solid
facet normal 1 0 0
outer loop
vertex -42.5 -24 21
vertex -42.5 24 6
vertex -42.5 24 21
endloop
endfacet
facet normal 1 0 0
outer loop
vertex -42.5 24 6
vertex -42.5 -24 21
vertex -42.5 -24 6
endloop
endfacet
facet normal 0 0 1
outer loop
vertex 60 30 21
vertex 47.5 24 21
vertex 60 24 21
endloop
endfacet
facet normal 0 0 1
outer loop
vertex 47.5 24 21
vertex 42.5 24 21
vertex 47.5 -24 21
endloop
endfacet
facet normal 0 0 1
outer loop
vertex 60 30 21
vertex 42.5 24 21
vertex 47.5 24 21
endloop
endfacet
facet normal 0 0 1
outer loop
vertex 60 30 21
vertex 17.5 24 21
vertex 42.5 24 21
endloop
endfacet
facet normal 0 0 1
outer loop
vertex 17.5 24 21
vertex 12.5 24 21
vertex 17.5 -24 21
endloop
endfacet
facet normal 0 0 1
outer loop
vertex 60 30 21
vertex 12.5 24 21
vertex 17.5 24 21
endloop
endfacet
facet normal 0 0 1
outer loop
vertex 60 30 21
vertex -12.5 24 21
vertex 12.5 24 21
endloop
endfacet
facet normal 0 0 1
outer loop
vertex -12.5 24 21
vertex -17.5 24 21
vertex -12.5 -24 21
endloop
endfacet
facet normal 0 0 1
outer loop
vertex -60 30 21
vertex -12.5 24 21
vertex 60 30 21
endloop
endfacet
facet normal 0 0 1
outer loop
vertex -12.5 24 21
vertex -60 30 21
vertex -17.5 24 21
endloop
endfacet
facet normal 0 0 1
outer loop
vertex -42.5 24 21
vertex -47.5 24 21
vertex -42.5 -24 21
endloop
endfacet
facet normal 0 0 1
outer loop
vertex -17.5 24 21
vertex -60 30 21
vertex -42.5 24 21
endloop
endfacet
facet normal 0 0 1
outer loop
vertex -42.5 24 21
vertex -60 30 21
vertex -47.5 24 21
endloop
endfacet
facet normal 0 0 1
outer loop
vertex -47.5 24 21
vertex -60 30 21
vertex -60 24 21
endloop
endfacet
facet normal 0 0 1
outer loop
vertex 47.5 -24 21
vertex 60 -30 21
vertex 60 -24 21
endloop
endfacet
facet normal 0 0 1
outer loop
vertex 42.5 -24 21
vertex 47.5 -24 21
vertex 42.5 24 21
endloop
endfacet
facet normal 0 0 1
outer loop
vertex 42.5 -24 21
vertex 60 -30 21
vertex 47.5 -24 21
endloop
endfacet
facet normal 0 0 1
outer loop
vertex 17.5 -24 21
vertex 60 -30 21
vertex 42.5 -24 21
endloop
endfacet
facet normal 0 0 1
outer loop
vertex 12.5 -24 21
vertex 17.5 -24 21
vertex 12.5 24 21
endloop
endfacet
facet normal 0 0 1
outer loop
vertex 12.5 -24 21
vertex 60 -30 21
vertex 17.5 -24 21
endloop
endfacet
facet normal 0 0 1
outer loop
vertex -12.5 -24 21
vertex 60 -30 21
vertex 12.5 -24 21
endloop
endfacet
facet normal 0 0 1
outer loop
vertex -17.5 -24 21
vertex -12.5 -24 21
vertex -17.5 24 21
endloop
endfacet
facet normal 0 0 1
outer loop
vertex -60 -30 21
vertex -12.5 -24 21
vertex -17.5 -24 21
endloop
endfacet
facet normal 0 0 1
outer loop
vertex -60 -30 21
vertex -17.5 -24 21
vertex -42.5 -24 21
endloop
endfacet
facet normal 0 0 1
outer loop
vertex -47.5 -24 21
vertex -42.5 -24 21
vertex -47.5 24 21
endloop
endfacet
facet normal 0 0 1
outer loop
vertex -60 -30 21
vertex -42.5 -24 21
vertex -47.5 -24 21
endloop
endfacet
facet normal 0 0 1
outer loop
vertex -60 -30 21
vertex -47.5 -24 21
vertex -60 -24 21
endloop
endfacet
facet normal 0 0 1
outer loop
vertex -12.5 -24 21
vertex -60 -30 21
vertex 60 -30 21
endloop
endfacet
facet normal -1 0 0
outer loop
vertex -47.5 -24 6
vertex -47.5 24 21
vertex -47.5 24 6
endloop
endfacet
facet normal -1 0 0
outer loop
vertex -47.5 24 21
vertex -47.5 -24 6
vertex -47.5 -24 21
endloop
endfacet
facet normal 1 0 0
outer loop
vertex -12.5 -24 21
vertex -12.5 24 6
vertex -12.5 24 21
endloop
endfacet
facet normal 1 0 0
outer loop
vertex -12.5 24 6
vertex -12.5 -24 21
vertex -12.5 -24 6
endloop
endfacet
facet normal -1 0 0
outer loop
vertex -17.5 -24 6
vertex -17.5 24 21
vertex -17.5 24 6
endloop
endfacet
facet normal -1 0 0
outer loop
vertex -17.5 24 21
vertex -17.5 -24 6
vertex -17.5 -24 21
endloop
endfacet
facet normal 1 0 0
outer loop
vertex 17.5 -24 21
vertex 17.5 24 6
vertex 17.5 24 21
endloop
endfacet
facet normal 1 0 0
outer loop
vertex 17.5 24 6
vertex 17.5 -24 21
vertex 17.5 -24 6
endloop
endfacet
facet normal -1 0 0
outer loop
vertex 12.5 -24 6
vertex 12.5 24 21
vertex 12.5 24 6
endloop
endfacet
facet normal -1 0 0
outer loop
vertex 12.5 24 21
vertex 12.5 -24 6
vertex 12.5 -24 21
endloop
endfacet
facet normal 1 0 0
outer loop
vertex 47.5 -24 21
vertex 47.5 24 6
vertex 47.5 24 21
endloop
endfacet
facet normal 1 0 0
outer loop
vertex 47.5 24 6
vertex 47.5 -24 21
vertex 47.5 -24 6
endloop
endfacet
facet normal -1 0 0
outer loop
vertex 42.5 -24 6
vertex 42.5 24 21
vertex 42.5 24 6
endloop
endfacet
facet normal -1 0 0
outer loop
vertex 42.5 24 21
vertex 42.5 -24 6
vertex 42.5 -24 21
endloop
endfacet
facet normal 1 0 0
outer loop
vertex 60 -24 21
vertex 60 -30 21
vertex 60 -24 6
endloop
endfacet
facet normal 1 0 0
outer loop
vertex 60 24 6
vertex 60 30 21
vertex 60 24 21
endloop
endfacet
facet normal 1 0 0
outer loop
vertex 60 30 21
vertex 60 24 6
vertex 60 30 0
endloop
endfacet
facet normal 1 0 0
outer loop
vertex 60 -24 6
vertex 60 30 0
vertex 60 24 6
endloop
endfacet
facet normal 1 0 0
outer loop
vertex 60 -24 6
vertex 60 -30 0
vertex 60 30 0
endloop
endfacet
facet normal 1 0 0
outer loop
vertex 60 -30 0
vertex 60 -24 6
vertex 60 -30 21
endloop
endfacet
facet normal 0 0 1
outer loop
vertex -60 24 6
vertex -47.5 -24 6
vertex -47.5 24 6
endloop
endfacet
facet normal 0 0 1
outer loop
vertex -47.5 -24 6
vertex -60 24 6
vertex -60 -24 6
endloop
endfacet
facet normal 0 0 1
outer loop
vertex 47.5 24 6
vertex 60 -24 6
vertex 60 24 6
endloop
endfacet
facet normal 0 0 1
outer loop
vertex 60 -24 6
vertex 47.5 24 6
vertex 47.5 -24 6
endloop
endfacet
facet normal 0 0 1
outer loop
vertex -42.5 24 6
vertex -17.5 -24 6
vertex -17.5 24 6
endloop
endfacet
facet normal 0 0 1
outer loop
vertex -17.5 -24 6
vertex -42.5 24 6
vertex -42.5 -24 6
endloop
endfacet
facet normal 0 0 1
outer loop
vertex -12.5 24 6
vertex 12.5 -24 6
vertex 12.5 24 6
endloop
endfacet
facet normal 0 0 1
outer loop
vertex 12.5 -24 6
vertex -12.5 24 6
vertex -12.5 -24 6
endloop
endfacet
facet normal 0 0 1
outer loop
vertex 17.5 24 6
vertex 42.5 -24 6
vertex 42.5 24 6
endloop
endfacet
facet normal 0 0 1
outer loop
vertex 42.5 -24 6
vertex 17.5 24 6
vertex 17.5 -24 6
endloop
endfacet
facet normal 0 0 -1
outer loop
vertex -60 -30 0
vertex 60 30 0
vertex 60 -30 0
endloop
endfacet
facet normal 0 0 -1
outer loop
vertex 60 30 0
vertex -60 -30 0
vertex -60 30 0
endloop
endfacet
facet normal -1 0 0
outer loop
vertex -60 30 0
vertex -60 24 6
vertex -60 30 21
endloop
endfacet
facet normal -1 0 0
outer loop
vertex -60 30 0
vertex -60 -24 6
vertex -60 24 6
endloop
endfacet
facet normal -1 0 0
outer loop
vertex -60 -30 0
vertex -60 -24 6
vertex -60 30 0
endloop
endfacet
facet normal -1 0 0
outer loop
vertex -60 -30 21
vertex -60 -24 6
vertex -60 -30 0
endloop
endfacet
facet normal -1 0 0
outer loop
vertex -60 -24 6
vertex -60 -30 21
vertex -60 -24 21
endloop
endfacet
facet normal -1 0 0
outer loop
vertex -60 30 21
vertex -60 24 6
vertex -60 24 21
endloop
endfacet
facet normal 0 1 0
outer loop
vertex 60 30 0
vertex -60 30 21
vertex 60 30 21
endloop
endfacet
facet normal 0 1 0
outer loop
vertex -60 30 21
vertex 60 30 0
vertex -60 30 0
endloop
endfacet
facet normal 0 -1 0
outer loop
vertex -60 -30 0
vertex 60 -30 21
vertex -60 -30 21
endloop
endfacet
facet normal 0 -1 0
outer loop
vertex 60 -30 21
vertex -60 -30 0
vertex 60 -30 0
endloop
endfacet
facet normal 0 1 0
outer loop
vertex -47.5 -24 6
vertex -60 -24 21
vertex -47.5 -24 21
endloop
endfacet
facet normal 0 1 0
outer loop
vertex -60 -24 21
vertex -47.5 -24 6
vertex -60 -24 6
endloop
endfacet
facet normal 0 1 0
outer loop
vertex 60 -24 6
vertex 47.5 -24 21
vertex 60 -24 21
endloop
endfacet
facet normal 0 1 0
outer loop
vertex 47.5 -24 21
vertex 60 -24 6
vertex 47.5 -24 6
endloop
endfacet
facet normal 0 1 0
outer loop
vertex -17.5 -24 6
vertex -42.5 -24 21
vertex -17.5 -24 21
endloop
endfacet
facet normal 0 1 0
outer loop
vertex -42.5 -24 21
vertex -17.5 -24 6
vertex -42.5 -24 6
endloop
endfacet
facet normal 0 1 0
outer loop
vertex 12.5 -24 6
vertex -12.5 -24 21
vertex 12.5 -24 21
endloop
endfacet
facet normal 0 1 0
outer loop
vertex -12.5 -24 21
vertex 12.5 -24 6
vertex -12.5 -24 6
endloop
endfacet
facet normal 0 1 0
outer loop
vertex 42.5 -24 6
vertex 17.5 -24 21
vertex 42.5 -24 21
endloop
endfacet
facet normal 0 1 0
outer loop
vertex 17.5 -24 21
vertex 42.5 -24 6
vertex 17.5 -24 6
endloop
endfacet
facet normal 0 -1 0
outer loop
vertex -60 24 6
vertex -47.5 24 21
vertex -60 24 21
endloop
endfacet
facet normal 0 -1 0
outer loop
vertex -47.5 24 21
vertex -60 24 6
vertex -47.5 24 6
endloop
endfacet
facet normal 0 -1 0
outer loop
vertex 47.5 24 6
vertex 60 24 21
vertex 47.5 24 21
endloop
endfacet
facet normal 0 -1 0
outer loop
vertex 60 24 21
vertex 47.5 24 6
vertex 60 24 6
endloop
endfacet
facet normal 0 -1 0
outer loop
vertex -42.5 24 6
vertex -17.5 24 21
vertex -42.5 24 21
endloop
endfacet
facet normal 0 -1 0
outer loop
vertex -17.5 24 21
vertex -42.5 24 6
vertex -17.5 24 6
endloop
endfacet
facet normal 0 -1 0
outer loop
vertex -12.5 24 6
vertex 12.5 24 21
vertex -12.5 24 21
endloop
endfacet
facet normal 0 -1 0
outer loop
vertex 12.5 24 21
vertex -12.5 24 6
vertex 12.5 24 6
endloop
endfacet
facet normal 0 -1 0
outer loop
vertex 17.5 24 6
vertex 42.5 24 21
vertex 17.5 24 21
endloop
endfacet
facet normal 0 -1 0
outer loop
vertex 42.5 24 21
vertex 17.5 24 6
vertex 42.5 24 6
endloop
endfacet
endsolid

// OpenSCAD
$fn = 32;

// ----------------------------------------------------------------------
// Rib frame 120 x 60 x 21
// 4 ribs at 30 mm pitch
// ----------------------------------------------------------------------

// --- parameters (mm) ---
frame = [120, 60, 6];  // base plate size (x, y, z)
rail_w = 6;            // side rail width
ribs = 4;              // number of ribs
rib_t = 5;             // rib thickness
rib_h = 15;            // rib height above the base plate
pitch = 30;            // pitch between rib centres

// --- derived feature positions (mm) ---
span = (ribs - 1) * pitch;          // = 90   distance between the outer ribs
origin_x = -span / 2;               // = -45   X of the first rib
rib_len = frame[1] - 2 * rail_w + 2;  // = 50   rib length, 1 mm into each rail
feature_centers = [
  [origin_x + 0 * pitch, 0],
  [origin_x + 1 * pitch, 0],
  [origin_x + 2 * pitch, 0],
  [origin_x + 3 * pitch, 0]
];   // rib centre line, drives the rib loop

// base plate, two side rails, then the ribs read straight off feature_centers
union() {
  translate([-frame[0] / 2, -frame[1] / 2, 0]) cube(frame);
  translate([-frame[0] / 2, -frame[1] / 2, 0]) cube([frame[0], rail_w, frame[2] + rib_h]);
  translate([-frame[0] / 2, frame[1] / 2 - rail_w, 0]) cube([frame[0], rail_w, frame[2] + rib_h]);
  for (centre = feature_centers)
    translate([centre[0] - rib_t / 2, centre[1] - rib_len / 2, frame[2] - 1])
      cube([rib_t, rib_len, rib_h + 1]);
}
